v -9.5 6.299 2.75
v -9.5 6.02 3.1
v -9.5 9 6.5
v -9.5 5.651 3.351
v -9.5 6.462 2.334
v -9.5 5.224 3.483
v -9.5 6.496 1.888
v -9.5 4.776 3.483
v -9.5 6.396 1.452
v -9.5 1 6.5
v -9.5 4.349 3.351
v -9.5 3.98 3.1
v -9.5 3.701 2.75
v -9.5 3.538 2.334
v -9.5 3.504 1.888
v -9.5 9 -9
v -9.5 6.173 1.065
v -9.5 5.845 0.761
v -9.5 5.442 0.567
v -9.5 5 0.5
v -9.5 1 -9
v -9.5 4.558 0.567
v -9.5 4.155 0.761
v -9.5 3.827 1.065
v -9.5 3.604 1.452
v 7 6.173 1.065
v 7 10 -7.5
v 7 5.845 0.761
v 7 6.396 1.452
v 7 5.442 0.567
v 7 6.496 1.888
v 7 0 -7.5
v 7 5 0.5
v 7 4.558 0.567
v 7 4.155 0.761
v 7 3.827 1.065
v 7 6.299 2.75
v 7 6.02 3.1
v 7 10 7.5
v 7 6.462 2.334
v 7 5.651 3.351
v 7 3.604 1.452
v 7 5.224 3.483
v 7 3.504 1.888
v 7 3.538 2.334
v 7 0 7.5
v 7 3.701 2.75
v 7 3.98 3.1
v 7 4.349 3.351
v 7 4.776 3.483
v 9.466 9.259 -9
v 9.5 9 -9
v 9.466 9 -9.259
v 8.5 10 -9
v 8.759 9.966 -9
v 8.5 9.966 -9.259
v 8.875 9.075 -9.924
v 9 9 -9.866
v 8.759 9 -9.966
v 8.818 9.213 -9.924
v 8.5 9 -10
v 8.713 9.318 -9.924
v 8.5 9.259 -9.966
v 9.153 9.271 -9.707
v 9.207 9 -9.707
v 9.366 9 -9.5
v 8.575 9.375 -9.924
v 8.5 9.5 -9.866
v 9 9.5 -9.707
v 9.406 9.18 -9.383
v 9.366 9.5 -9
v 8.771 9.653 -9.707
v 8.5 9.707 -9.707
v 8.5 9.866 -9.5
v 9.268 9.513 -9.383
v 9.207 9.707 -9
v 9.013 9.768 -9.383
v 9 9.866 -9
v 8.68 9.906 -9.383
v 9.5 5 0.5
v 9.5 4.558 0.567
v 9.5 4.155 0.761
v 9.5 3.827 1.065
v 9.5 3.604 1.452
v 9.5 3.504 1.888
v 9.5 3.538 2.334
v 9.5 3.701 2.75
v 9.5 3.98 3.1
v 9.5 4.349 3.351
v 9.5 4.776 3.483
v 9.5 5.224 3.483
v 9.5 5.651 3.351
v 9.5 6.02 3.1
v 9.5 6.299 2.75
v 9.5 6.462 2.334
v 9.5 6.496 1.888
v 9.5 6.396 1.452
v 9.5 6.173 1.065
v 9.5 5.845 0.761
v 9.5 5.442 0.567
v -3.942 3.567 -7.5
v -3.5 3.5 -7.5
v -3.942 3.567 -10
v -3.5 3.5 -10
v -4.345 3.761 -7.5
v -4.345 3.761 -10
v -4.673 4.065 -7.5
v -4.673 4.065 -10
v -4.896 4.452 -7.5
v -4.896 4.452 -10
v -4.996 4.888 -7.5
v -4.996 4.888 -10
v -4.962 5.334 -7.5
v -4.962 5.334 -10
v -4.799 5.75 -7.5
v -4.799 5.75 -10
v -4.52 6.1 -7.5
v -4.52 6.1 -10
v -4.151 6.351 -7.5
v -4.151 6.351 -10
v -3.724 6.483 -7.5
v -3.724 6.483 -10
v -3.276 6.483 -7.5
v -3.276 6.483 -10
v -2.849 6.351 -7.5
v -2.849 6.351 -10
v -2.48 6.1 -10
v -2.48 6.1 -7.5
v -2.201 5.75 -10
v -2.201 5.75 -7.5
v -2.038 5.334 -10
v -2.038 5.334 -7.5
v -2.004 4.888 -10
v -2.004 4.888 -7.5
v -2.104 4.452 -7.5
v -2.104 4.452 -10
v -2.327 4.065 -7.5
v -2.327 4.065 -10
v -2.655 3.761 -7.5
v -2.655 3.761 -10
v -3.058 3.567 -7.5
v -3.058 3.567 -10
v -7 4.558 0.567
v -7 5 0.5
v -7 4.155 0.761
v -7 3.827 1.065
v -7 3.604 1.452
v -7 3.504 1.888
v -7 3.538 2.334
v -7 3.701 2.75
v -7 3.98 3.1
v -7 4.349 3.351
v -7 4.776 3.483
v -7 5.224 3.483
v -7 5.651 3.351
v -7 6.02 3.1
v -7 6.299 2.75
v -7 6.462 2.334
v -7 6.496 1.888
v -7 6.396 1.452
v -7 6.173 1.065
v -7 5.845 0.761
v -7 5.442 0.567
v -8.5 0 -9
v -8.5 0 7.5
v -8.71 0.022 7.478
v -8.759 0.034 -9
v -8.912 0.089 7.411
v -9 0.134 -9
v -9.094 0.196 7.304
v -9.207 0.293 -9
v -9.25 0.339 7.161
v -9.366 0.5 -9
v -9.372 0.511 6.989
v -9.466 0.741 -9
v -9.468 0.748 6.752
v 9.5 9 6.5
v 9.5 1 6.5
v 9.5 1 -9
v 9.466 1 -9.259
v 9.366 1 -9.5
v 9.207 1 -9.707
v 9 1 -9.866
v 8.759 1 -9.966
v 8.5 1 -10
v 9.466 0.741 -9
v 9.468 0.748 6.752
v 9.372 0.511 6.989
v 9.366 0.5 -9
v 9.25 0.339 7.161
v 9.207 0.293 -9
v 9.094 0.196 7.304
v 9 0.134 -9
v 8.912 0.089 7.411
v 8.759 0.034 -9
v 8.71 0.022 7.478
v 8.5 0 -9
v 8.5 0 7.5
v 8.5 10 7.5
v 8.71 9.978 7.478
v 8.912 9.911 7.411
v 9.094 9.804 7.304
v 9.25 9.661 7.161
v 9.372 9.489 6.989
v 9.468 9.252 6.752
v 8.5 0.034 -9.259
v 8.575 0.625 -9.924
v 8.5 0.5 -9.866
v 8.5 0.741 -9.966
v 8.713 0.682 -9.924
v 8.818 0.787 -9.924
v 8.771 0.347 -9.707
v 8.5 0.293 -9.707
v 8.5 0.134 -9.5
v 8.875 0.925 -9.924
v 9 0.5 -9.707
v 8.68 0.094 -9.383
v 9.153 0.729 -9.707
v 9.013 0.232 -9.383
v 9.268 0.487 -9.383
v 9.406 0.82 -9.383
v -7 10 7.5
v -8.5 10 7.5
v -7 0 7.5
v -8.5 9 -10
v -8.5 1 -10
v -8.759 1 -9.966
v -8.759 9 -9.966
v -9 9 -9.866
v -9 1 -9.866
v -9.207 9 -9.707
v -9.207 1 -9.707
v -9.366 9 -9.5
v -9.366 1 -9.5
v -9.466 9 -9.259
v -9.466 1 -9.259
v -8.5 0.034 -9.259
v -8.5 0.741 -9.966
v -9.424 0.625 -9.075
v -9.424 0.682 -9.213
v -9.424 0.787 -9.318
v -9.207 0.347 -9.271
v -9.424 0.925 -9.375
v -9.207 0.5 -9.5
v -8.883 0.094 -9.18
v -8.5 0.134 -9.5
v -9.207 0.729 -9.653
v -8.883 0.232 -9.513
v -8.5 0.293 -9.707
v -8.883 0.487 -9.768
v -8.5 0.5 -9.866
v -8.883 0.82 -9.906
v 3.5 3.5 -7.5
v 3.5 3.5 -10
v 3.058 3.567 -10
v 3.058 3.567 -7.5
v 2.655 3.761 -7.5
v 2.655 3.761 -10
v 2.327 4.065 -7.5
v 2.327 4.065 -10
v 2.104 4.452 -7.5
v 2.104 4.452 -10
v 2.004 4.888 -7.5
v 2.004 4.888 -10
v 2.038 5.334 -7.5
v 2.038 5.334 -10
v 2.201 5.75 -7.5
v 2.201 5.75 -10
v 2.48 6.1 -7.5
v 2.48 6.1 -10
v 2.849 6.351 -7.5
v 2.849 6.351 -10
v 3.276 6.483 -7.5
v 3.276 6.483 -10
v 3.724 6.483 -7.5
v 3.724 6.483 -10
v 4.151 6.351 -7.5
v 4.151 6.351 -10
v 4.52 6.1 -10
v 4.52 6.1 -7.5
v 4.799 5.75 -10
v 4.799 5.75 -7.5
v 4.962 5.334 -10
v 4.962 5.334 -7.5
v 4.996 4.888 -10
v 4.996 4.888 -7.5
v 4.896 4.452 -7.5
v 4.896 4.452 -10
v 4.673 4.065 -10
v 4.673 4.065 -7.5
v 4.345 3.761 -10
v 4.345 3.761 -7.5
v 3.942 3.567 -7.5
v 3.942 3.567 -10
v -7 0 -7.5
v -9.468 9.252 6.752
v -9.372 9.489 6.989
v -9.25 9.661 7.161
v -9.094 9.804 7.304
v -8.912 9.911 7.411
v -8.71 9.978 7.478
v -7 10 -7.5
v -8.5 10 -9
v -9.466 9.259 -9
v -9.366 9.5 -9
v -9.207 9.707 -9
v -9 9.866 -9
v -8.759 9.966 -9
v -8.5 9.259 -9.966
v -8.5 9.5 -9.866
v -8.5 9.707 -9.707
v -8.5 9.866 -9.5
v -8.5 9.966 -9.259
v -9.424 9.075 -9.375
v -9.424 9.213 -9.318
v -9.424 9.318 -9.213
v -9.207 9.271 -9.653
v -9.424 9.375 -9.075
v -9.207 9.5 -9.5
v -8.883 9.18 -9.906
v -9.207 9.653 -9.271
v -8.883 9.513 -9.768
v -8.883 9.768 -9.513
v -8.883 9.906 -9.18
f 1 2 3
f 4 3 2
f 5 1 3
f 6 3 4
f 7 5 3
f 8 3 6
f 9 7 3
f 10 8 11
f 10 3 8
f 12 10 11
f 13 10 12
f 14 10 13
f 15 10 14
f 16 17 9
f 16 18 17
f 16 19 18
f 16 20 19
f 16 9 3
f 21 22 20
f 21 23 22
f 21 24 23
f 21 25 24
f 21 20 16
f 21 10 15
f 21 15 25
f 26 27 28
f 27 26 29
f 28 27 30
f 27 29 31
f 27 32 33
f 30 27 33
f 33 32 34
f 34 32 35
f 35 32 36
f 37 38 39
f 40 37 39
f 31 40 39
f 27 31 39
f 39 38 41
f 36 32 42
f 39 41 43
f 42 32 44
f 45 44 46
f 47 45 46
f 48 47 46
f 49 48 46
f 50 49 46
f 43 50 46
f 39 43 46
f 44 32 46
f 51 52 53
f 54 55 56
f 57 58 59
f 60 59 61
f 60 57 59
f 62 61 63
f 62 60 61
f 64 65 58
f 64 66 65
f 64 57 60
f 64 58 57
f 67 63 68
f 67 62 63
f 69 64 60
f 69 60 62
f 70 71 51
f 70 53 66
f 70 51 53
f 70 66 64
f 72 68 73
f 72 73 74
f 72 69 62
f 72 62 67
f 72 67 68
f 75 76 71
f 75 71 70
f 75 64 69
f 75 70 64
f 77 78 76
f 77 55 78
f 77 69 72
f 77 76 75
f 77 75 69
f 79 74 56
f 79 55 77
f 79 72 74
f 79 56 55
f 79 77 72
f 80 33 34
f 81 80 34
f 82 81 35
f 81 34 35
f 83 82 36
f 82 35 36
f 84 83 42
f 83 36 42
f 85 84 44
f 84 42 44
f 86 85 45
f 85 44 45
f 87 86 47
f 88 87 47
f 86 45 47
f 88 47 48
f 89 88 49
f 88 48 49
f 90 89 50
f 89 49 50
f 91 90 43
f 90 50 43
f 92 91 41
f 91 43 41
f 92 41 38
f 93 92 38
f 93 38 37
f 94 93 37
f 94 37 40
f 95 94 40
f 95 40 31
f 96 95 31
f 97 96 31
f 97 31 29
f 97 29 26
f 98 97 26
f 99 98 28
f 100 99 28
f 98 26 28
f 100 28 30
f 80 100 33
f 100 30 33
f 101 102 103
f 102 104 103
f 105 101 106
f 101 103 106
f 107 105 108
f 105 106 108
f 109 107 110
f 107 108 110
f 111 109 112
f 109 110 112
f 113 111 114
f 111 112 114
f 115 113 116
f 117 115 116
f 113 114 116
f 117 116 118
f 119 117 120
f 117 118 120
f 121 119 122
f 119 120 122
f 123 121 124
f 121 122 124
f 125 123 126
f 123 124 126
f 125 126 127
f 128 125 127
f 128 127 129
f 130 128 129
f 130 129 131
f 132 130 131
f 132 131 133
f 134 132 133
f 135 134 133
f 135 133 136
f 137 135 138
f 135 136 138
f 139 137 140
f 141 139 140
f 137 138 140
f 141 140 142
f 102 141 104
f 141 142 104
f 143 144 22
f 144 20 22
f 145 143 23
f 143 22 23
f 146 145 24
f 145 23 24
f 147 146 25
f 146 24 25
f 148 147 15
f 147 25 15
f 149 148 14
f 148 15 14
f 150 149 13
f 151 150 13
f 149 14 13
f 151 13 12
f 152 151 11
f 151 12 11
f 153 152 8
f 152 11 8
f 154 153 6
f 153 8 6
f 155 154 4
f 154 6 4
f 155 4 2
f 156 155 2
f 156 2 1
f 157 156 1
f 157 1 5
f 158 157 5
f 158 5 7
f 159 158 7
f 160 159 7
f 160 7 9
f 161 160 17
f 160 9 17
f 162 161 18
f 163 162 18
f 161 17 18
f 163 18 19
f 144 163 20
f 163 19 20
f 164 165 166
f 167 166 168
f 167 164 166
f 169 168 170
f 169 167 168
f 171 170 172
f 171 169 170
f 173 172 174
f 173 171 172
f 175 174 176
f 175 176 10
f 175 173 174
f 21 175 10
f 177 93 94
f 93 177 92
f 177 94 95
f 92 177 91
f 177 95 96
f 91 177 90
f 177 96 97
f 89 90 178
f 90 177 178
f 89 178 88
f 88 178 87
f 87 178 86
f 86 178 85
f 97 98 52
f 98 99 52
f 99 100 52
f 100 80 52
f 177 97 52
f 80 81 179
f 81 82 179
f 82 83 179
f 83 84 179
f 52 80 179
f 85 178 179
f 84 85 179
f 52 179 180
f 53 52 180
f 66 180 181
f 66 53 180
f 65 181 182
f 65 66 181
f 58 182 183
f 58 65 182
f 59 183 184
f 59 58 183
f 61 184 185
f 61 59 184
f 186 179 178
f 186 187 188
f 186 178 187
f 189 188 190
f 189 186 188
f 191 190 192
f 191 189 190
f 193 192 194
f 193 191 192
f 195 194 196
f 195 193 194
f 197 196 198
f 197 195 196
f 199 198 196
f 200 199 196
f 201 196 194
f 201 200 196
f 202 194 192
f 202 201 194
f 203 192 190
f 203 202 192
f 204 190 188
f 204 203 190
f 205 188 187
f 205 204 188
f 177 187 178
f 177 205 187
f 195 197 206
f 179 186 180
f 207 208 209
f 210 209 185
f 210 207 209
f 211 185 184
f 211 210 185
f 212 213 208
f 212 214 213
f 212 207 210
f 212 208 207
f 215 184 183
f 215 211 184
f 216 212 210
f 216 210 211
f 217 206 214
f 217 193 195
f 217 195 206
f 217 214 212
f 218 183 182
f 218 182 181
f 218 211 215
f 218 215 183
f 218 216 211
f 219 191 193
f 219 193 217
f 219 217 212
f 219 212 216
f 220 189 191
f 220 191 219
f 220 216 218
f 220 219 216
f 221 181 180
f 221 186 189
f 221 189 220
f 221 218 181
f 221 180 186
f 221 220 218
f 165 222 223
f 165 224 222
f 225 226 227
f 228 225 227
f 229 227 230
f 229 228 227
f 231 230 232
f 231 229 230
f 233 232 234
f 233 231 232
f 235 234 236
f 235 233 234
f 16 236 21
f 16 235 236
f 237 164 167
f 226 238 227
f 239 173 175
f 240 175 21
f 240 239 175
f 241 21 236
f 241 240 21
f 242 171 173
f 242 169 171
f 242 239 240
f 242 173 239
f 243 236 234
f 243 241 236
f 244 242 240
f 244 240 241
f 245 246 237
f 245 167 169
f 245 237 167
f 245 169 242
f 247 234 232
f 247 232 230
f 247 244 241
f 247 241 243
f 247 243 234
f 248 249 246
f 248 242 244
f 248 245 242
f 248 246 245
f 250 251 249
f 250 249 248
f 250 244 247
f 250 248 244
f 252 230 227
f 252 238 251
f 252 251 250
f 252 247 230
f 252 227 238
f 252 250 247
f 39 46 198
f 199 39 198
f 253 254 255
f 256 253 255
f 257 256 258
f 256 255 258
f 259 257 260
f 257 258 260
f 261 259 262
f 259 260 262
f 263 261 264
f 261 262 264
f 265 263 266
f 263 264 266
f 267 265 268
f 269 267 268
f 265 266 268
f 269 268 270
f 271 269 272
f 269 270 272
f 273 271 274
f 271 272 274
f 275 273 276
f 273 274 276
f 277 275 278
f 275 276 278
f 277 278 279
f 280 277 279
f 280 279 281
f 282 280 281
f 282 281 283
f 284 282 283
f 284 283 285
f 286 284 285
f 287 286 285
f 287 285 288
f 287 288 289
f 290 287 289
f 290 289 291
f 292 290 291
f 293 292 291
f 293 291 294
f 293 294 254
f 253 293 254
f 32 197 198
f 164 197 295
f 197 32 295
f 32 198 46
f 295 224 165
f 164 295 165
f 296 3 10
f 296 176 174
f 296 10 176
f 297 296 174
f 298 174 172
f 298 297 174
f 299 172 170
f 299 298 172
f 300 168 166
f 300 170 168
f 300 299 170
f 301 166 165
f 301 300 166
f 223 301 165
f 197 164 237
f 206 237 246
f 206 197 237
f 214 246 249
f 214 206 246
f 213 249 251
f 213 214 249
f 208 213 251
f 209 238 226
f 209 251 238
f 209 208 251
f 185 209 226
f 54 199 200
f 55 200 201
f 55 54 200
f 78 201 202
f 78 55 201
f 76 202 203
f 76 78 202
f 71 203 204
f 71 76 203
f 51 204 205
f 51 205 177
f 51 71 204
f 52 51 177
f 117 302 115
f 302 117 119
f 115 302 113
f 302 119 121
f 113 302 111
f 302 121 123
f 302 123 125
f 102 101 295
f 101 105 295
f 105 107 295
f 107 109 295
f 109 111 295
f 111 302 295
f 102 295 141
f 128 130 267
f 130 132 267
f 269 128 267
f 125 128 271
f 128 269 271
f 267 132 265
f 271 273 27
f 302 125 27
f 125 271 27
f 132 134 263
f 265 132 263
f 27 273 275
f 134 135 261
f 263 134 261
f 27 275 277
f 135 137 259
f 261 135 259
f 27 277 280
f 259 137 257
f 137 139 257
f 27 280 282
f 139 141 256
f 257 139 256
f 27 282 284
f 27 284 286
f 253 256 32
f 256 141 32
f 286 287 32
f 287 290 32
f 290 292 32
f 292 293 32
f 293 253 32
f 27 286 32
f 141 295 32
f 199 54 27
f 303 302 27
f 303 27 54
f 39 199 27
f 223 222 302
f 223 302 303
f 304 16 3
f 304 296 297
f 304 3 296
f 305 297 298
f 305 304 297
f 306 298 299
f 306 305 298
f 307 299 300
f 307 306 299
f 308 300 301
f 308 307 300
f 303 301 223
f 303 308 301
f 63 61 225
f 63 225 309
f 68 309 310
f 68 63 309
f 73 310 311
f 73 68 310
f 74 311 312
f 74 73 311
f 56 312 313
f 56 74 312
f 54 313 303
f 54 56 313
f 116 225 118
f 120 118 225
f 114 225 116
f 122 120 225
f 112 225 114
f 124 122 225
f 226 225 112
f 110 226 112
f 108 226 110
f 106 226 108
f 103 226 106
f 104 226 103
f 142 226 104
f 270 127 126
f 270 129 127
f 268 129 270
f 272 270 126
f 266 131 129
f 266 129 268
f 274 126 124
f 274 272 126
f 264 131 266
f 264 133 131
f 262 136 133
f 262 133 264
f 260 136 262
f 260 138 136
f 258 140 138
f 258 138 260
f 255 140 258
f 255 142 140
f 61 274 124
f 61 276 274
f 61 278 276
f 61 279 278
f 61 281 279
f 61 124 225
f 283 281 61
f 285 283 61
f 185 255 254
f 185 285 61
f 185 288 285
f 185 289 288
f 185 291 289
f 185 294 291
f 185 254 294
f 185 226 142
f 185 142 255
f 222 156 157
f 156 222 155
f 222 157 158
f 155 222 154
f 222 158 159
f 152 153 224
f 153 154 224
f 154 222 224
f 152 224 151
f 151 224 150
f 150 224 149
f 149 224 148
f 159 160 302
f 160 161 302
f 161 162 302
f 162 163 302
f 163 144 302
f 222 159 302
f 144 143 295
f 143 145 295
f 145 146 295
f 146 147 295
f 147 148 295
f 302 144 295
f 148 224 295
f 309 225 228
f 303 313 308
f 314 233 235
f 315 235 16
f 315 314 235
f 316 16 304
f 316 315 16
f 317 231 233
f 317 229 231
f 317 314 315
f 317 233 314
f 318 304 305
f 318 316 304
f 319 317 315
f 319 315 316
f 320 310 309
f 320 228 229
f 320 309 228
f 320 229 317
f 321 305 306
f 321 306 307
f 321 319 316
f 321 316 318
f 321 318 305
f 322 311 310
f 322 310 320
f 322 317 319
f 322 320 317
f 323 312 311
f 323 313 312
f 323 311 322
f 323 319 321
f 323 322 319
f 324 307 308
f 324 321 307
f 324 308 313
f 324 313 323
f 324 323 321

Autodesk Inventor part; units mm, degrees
ref_plane "YZ Plane" through (0, 0, 0) normal (1, 0, 0) x (0, 1, 0)
ref_plane "XZ Plane" through (0, 0, 0) normal (0, 1, 0) x (-1, 0, 0)
ref_plane "XY Plane" through (0, 0, 0) normal (0, 0, 1) x (1, 0, 0)
sketch "Sketch1" plane through (0, 0, 0) normal (0, 1, 0) x (-1, 0, 0)
  line L0 (7, -7.5) -> (-7, -7.5)
  line L1 (-7, -7.5) -> (-7, 7.5)
  line L2 (7, 7.5) -> (7, -7.5)
  line L3 (9.5, -10) -> (-9.5, -10)
  line L4 (9.5, 7.5) -> (9.5, -10)
  line L5 (7, 7.5) -> (9.5, 7.5)
  line L6 (-7, 7.5) -> (-9.5, 7.5)
  line L7 (-9.5, 7.5) -> (-9.5, -10)
  point P0 (0, 0)
  point P1 (0, -7.5)
  point P2 (7, 0)
  point P3 (9.5, 0)
  point P4 (0, -10)
  point P5 (8.25, 7.5)
  point P6 (-8.25, 7.5)
  dimension "d0" = 14
  dimension "d1" = 15
  dimension "d2" = 19
  dimension "d4" = 2.5
extrude "Extrusion1" add sketch "Sketch1" along normal blind 10
sketch "Sketch2" plane through (-7, 0, -7.5) normal (0, 0, 1) x (1, 0, 0)
  point P0 (7, 0)
sketch "Sketch3" plane through (-7, 0, -7.5) normal (0, 0, 1) x (1, 0, 0)
  line L0 (0, 0) -> (14, 0) projected
  line L1 (14, 0) -> (14, 10) projected
  point P0 (7, 0)
  point P1 (10.5, 5)
  point P2 (3.5, 5)
  point P3 (7, 5)
  point P4 (7, 0)
  point P5 (14, 5)
  point P6 (7, 0)
  point P7 (7, 0)
  point P8 (14, 5)
  dimension "d7" = 7
  dimension "d8" = 3.5
  dimension "d9" = 3.5
hole "Hole1" at (-3.5, 5, -7.5) at (3.5, 5, -7.5) direction (0, 0, -1) diameter 3 depth 2.5
sketch "Sketch4" plane through (9.5, 0, 7.5) normal (1, 0, 0) x (0, 0, -1)
  line L0 (17.5, 0) -> (17.5, 10) projected
  point P0 (7.5, 0)
  point P1 (5.5, 5)
  point P2 (15, 10)
  point P3 (17.5, 5)
  dimension "d21" = 9.5
hole "Hole2" at (9.5, 5, 2) direction (-1, 0, 0) diameter 3 depth 19
fillet "Fillet1" radius 1 10 edges at (9.5, 10, -1.25) (9.5, 0, -1.25) (9.5, 5, 7.5) (9.5, 5, -10) (0, 10, -10) (0, 0, -10) (-9.5, 5, -10) (-9.5, 10, -1.25) (-9.5, 0, -1.25) (-9.5, 5, 7.5)
properties part number "Part_B6"
